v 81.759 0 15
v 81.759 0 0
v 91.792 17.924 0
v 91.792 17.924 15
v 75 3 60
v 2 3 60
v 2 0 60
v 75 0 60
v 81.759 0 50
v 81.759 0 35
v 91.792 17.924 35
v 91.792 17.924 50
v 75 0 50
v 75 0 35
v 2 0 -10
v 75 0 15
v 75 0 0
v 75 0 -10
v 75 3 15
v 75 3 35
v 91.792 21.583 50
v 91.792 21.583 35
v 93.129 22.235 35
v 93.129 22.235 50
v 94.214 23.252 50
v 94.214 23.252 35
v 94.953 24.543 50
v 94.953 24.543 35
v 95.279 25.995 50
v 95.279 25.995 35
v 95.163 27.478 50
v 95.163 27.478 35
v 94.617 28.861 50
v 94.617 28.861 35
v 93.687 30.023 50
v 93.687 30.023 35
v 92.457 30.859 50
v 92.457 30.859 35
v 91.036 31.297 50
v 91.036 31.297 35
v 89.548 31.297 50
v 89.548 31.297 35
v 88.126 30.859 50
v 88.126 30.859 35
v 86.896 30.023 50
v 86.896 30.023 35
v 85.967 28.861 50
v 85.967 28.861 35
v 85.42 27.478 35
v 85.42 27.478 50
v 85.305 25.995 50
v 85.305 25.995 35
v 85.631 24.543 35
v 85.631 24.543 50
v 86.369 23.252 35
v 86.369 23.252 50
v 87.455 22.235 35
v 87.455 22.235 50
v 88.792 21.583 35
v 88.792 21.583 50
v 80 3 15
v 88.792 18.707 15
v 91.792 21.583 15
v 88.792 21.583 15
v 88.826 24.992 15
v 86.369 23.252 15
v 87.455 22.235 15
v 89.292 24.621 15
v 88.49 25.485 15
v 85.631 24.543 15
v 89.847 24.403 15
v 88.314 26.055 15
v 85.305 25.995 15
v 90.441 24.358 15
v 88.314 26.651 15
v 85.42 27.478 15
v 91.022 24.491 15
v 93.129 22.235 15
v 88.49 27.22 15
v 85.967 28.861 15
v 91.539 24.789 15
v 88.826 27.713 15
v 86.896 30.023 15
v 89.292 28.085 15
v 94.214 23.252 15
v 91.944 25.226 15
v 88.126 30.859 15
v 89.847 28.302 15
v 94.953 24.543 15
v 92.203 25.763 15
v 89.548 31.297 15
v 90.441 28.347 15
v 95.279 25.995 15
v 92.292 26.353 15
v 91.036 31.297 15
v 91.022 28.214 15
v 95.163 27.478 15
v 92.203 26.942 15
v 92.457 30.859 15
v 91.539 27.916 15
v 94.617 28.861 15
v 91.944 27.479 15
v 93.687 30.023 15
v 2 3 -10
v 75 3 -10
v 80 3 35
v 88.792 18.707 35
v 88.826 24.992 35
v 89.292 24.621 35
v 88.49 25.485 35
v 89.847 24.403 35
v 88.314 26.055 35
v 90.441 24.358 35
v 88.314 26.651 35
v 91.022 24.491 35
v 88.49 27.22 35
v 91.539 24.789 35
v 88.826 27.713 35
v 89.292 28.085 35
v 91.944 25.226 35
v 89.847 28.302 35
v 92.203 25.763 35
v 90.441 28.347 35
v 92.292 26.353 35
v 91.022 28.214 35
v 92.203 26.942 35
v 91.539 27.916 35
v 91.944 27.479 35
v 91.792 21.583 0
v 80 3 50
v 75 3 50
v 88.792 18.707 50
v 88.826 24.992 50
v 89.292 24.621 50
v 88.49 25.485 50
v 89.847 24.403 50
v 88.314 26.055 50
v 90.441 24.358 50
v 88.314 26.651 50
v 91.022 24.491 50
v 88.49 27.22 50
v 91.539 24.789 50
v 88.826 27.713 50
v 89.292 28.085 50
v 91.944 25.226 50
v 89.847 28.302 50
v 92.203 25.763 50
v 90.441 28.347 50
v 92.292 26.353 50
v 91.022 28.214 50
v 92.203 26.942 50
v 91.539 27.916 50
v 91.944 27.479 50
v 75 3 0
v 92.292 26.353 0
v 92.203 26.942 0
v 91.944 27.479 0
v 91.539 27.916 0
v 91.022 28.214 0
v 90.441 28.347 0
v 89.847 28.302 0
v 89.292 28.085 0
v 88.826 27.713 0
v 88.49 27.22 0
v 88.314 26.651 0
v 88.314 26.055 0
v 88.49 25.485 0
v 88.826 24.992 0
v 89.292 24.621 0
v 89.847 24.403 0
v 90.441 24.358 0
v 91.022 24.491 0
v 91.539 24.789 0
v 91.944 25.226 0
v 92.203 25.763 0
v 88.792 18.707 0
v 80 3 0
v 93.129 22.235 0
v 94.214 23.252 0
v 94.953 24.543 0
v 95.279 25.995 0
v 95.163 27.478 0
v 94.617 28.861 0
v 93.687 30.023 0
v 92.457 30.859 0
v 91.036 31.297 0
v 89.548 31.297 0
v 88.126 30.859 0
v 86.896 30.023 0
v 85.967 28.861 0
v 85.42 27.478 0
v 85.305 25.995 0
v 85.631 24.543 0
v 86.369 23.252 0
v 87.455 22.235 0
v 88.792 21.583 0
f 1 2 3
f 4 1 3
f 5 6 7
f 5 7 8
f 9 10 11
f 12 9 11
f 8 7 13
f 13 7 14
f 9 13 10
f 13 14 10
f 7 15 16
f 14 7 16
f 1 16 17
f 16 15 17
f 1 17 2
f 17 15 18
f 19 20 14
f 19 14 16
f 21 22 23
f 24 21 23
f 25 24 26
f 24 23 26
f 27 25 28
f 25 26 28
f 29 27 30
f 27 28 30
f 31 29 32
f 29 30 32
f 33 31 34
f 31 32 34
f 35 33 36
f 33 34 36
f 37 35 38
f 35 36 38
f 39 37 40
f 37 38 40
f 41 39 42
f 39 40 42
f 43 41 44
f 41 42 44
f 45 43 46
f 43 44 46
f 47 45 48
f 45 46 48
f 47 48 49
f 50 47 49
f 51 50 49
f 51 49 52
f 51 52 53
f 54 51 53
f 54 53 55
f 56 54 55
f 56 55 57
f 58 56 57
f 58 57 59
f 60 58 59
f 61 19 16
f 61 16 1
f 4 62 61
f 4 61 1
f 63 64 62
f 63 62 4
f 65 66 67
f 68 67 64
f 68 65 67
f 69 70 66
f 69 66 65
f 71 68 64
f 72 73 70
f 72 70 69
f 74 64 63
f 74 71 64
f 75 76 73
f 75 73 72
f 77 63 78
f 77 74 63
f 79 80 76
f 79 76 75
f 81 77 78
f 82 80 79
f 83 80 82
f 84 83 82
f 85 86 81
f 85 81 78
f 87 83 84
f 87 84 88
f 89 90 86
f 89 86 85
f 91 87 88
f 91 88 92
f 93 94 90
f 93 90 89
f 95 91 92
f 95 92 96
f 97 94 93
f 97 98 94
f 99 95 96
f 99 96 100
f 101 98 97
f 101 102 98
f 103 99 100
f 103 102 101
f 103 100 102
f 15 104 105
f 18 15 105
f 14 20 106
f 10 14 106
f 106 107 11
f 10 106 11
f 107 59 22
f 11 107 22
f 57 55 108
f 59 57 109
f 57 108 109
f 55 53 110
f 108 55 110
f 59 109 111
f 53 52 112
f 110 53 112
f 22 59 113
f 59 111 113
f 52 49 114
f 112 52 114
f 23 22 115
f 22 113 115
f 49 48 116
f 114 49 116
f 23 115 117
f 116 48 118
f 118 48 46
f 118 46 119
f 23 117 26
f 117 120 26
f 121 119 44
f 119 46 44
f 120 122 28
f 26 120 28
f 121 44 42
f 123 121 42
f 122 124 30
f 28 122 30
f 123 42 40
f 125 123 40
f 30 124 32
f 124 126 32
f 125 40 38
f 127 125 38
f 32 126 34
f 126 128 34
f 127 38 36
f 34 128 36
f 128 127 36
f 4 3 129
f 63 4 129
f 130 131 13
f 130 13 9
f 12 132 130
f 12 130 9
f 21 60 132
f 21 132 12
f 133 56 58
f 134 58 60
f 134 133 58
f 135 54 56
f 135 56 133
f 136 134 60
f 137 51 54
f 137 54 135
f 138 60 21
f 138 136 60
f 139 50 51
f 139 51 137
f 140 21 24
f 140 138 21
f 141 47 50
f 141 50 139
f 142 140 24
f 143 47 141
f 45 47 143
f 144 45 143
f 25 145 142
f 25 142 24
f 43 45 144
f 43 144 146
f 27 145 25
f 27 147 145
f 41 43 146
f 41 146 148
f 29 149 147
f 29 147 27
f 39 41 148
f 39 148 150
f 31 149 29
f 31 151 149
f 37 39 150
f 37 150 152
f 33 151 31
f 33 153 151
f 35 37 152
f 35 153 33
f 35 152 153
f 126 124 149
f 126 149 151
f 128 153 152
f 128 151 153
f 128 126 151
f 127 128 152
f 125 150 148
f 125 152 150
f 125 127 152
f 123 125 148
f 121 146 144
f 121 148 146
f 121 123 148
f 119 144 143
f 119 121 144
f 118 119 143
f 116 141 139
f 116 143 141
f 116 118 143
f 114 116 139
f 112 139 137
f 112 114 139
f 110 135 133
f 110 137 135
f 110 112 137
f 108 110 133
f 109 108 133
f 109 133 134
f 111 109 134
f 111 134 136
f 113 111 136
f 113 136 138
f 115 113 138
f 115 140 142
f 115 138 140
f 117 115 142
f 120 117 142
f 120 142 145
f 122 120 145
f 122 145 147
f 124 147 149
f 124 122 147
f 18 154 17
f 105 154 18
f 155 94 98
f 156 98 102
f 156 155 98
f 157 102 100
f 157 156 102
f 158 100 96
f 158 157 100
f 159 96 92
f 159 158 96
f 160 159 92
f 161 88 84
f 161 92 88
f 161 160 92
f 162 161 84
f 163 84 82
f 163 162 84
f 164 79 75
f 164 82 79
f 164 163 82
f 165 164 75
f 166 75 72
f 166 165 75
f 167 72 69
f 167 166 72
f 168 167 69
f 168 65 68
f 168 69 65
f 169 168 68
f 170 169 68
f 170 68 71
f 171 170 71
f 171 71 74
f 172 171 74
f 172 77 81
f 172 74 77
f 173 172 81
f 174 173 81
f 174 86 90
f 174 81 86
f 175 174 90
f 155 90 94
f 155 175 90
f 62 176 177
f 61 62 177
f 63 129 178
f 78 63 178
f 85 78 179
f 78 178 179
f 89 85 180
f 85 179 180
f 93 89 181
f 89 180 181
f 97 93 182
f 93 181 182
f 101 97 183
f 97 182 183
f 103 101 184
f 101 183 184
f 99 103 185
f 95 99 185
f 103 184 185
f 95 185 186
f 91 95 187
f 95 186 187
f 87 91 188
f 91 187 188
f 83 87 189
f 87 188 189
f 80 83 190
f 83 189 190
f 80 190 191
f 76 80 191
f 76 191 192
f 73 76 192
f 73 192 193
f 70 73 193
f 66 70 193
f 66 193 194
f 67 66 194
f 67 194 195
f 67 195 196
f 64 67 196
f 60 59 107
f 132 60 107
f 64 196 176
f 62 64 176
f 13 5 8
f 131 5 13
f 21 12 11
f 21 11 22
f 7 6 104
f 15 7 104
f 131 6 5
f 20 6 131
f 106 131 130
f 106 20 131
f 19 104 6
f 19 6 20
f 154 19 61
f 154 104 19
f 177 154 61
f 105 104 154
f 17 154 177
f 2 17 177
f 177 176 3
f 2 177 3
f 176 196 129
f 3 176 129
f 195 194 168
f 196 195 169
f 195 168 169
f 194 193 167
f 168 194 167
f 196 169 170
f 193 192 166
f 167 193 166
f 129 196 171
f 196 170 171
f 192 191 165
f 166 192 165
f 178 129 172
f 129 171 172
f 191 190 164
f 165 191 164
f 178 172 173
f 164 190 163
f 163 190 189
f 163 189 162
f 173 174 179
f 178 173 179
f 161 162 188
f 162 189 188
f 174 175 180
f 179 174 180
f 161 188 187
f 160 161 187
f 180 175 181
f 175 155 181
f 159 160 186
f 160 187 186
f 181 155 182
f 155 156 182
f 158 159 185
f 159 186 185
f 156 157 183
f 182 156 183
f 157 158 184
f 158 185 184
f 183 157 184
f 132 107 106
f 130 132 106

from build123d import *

# Parameters (mm, degrees)
SKETCH1_R               = 5
BOSS_EXTRUDE1_DEPTH     = 50
SKETCH2_R               = 2
CUT_EXTRUDE1_DEPTH      = 51
SKETCH7_W               = 20
SKETCH7_H               = 39.987182744
CUT_EXTRUDE3_DEPTH      = 10
CUT_EXTRUDE3_DEPTH_BACK = 10
BOSS_EXTRUDE2_REACH     = 52
CUT_EXTRUDE4_REACH      = 97.292
SKETCH9_W               = 20
SKETCH9_H               = 10.896319728
CUT_EXTRUDE6_REACH      = 52
SKETCH11_W              = 5
SKETCH11_H              = 3
SKETCH12_W              = 73
SKETCH12_H              = 70
BOSS_EXTRUDE3_DEPTH     = 3
SKETCH13_W              = 6.758772051
SKETCH13_H              = 20
CUT_EXTRUDE7_DEPTH      = 4


with BuildPart() as part:
    # Sketch1 → Boss-Extrude1 (new body)
    with BuildSketch(Plane.XY):
        with Locations((90.291740814, 26.352640412)):
            Circle(SKETCH1_R)
        Polygon((0, 3), (0, 0), (81.758772051, 0), (91.791740814, 17.924366601), (91.791740814, 23.706854983), (88.791740814, 23.706854983), (88.791740814, 18.706854983), (80, 3), align=None)
    extrude(amount=BOSS_EXTRUDE1_DEPTH)

    # Sketch2 → Cut-Extrude1 (cut, through all)
    with BuildSketch(Plane.XY):
        with Locations((90.291740814, 26.352640412)):
            Circle(SKETCH2_R)
    extrude(amount=CUT_EXTRUDE1_DEPTH, mode=Mode.SUBTRACT)

    # Sketch7 → Cut-Extrude3 (cut, two sides)
    with BuildSketch(Plane(origin=(62.254079791, -34.846042362, 0), x_dir=(0, 0, -1), z_dir=(0.872603055, -0.488430045, 0))) as cut_extrude3_sk:
        with Locations((-25, 59.927032101)):
            Rectangle(SKETCH7_W, SKETCH7_H)
    extrude(amount=CUT_EXTRUDE3_DEPTH, mode=Mode.SUBTRACT)
    extrude(cut_extrude3_sk.sketch, amount=-CUT_EXTRUDE3_DEPTH_BACK, mode=Mode.SUBTRACT)

    # Sketch8 → Boss-Extrude2 (add, up to next)
    with BuildSketch(Plane.XY, mode=Mode.PRIVATE) as boss_extrude2_sk1:
        Polygon((66.951015515, 3), (66.951015515, 0), (81.758772051, 0), (79.25400484, 1.667244856), (80, 3), align=None)
    boss_extrude2_tool1 = extrude(boss_extrude2_sk1.sketch, amount=BOSS_EXTRUDE2_REACH, mode=Mode.PRIVATE) - part.part
    add(boss_extrude2_tool1.solids().sort_by_distance((73.552437, 1.463367, 0))[0])

    # Sketch9 → Cut-Extrude4 (cut, up to next)
    with BuildSketch(Plane(origin=(0, 0, 0), x_dir=(0, 0, -1), z_dir=(1, 0, 0)), mode=Mode.PRIVATE) as cut_extrude4_sk1:
        with Locations((-25, 32.01270193)):
            Rectangle(SKETCH9_W, SKETCH9_H)
    cut_extrude4_tool1 = extrude(cut_extrude4_sk1.sketch, amount=CUT_EXTRUDE4_REACH, mode=Mode.PRIVATE) & part.part
    add(cut_extrude4_tool1.solids().sort_by_distance((0, 32.012702, 25))[0], mode=Mode.SUBTRACT)

    # Sketch11 → Cut-Extrude6 (cut, up to next)
    with BuildSketch(Plane.XY.offset(50), mode=Mode.PRIVATE) as cut_extrude6_sk1:
        with Locations((2.5, 1.5)):
            Rectangle(SKETCH11_W, SKETCH11_H)
    cut_extrude6_tool1 = extrude(cut_extrude6_sk1.sketch, amount=-CUT_EXTRUDE6_REACH, mode=Mode.PRIVATE) & part.part
    add(cut_extrude6_tool1.solids().sort_by_distance((2.5, 1.5, 50))[0], mode=Mode.SUBTRACT)

    # Sketch12 → Boss-Extrude3 (add, through all)
    with BuildSketch(Plane(origin=(0, 3, 0), x_dir=(1, 0, 0), z_dir=(0, 1, 0))):
        with Locations((38.5, -25)):
            Rectangle(SKETCH12_W, SKETCH12_H)
    extrude(amount=-BOSS_EXTRUDE3_DEPTH)

    # Sketch13 → Cut-Extrude7 (cut, through all)
    with BuildSketch(Plane(origin=(0, 3, 0), x_dir=(1, 0, 0), z_dir=(0, 1, 0))):
        with Locations((78.379386025, -25)):
            Rectangle(SKETCH13_W, SKETCH13_H)
    extrude(amount=-CUT_EXTRUDE7_DEPTH, mode=Mode.SUBTRACT)


solid = part.part
